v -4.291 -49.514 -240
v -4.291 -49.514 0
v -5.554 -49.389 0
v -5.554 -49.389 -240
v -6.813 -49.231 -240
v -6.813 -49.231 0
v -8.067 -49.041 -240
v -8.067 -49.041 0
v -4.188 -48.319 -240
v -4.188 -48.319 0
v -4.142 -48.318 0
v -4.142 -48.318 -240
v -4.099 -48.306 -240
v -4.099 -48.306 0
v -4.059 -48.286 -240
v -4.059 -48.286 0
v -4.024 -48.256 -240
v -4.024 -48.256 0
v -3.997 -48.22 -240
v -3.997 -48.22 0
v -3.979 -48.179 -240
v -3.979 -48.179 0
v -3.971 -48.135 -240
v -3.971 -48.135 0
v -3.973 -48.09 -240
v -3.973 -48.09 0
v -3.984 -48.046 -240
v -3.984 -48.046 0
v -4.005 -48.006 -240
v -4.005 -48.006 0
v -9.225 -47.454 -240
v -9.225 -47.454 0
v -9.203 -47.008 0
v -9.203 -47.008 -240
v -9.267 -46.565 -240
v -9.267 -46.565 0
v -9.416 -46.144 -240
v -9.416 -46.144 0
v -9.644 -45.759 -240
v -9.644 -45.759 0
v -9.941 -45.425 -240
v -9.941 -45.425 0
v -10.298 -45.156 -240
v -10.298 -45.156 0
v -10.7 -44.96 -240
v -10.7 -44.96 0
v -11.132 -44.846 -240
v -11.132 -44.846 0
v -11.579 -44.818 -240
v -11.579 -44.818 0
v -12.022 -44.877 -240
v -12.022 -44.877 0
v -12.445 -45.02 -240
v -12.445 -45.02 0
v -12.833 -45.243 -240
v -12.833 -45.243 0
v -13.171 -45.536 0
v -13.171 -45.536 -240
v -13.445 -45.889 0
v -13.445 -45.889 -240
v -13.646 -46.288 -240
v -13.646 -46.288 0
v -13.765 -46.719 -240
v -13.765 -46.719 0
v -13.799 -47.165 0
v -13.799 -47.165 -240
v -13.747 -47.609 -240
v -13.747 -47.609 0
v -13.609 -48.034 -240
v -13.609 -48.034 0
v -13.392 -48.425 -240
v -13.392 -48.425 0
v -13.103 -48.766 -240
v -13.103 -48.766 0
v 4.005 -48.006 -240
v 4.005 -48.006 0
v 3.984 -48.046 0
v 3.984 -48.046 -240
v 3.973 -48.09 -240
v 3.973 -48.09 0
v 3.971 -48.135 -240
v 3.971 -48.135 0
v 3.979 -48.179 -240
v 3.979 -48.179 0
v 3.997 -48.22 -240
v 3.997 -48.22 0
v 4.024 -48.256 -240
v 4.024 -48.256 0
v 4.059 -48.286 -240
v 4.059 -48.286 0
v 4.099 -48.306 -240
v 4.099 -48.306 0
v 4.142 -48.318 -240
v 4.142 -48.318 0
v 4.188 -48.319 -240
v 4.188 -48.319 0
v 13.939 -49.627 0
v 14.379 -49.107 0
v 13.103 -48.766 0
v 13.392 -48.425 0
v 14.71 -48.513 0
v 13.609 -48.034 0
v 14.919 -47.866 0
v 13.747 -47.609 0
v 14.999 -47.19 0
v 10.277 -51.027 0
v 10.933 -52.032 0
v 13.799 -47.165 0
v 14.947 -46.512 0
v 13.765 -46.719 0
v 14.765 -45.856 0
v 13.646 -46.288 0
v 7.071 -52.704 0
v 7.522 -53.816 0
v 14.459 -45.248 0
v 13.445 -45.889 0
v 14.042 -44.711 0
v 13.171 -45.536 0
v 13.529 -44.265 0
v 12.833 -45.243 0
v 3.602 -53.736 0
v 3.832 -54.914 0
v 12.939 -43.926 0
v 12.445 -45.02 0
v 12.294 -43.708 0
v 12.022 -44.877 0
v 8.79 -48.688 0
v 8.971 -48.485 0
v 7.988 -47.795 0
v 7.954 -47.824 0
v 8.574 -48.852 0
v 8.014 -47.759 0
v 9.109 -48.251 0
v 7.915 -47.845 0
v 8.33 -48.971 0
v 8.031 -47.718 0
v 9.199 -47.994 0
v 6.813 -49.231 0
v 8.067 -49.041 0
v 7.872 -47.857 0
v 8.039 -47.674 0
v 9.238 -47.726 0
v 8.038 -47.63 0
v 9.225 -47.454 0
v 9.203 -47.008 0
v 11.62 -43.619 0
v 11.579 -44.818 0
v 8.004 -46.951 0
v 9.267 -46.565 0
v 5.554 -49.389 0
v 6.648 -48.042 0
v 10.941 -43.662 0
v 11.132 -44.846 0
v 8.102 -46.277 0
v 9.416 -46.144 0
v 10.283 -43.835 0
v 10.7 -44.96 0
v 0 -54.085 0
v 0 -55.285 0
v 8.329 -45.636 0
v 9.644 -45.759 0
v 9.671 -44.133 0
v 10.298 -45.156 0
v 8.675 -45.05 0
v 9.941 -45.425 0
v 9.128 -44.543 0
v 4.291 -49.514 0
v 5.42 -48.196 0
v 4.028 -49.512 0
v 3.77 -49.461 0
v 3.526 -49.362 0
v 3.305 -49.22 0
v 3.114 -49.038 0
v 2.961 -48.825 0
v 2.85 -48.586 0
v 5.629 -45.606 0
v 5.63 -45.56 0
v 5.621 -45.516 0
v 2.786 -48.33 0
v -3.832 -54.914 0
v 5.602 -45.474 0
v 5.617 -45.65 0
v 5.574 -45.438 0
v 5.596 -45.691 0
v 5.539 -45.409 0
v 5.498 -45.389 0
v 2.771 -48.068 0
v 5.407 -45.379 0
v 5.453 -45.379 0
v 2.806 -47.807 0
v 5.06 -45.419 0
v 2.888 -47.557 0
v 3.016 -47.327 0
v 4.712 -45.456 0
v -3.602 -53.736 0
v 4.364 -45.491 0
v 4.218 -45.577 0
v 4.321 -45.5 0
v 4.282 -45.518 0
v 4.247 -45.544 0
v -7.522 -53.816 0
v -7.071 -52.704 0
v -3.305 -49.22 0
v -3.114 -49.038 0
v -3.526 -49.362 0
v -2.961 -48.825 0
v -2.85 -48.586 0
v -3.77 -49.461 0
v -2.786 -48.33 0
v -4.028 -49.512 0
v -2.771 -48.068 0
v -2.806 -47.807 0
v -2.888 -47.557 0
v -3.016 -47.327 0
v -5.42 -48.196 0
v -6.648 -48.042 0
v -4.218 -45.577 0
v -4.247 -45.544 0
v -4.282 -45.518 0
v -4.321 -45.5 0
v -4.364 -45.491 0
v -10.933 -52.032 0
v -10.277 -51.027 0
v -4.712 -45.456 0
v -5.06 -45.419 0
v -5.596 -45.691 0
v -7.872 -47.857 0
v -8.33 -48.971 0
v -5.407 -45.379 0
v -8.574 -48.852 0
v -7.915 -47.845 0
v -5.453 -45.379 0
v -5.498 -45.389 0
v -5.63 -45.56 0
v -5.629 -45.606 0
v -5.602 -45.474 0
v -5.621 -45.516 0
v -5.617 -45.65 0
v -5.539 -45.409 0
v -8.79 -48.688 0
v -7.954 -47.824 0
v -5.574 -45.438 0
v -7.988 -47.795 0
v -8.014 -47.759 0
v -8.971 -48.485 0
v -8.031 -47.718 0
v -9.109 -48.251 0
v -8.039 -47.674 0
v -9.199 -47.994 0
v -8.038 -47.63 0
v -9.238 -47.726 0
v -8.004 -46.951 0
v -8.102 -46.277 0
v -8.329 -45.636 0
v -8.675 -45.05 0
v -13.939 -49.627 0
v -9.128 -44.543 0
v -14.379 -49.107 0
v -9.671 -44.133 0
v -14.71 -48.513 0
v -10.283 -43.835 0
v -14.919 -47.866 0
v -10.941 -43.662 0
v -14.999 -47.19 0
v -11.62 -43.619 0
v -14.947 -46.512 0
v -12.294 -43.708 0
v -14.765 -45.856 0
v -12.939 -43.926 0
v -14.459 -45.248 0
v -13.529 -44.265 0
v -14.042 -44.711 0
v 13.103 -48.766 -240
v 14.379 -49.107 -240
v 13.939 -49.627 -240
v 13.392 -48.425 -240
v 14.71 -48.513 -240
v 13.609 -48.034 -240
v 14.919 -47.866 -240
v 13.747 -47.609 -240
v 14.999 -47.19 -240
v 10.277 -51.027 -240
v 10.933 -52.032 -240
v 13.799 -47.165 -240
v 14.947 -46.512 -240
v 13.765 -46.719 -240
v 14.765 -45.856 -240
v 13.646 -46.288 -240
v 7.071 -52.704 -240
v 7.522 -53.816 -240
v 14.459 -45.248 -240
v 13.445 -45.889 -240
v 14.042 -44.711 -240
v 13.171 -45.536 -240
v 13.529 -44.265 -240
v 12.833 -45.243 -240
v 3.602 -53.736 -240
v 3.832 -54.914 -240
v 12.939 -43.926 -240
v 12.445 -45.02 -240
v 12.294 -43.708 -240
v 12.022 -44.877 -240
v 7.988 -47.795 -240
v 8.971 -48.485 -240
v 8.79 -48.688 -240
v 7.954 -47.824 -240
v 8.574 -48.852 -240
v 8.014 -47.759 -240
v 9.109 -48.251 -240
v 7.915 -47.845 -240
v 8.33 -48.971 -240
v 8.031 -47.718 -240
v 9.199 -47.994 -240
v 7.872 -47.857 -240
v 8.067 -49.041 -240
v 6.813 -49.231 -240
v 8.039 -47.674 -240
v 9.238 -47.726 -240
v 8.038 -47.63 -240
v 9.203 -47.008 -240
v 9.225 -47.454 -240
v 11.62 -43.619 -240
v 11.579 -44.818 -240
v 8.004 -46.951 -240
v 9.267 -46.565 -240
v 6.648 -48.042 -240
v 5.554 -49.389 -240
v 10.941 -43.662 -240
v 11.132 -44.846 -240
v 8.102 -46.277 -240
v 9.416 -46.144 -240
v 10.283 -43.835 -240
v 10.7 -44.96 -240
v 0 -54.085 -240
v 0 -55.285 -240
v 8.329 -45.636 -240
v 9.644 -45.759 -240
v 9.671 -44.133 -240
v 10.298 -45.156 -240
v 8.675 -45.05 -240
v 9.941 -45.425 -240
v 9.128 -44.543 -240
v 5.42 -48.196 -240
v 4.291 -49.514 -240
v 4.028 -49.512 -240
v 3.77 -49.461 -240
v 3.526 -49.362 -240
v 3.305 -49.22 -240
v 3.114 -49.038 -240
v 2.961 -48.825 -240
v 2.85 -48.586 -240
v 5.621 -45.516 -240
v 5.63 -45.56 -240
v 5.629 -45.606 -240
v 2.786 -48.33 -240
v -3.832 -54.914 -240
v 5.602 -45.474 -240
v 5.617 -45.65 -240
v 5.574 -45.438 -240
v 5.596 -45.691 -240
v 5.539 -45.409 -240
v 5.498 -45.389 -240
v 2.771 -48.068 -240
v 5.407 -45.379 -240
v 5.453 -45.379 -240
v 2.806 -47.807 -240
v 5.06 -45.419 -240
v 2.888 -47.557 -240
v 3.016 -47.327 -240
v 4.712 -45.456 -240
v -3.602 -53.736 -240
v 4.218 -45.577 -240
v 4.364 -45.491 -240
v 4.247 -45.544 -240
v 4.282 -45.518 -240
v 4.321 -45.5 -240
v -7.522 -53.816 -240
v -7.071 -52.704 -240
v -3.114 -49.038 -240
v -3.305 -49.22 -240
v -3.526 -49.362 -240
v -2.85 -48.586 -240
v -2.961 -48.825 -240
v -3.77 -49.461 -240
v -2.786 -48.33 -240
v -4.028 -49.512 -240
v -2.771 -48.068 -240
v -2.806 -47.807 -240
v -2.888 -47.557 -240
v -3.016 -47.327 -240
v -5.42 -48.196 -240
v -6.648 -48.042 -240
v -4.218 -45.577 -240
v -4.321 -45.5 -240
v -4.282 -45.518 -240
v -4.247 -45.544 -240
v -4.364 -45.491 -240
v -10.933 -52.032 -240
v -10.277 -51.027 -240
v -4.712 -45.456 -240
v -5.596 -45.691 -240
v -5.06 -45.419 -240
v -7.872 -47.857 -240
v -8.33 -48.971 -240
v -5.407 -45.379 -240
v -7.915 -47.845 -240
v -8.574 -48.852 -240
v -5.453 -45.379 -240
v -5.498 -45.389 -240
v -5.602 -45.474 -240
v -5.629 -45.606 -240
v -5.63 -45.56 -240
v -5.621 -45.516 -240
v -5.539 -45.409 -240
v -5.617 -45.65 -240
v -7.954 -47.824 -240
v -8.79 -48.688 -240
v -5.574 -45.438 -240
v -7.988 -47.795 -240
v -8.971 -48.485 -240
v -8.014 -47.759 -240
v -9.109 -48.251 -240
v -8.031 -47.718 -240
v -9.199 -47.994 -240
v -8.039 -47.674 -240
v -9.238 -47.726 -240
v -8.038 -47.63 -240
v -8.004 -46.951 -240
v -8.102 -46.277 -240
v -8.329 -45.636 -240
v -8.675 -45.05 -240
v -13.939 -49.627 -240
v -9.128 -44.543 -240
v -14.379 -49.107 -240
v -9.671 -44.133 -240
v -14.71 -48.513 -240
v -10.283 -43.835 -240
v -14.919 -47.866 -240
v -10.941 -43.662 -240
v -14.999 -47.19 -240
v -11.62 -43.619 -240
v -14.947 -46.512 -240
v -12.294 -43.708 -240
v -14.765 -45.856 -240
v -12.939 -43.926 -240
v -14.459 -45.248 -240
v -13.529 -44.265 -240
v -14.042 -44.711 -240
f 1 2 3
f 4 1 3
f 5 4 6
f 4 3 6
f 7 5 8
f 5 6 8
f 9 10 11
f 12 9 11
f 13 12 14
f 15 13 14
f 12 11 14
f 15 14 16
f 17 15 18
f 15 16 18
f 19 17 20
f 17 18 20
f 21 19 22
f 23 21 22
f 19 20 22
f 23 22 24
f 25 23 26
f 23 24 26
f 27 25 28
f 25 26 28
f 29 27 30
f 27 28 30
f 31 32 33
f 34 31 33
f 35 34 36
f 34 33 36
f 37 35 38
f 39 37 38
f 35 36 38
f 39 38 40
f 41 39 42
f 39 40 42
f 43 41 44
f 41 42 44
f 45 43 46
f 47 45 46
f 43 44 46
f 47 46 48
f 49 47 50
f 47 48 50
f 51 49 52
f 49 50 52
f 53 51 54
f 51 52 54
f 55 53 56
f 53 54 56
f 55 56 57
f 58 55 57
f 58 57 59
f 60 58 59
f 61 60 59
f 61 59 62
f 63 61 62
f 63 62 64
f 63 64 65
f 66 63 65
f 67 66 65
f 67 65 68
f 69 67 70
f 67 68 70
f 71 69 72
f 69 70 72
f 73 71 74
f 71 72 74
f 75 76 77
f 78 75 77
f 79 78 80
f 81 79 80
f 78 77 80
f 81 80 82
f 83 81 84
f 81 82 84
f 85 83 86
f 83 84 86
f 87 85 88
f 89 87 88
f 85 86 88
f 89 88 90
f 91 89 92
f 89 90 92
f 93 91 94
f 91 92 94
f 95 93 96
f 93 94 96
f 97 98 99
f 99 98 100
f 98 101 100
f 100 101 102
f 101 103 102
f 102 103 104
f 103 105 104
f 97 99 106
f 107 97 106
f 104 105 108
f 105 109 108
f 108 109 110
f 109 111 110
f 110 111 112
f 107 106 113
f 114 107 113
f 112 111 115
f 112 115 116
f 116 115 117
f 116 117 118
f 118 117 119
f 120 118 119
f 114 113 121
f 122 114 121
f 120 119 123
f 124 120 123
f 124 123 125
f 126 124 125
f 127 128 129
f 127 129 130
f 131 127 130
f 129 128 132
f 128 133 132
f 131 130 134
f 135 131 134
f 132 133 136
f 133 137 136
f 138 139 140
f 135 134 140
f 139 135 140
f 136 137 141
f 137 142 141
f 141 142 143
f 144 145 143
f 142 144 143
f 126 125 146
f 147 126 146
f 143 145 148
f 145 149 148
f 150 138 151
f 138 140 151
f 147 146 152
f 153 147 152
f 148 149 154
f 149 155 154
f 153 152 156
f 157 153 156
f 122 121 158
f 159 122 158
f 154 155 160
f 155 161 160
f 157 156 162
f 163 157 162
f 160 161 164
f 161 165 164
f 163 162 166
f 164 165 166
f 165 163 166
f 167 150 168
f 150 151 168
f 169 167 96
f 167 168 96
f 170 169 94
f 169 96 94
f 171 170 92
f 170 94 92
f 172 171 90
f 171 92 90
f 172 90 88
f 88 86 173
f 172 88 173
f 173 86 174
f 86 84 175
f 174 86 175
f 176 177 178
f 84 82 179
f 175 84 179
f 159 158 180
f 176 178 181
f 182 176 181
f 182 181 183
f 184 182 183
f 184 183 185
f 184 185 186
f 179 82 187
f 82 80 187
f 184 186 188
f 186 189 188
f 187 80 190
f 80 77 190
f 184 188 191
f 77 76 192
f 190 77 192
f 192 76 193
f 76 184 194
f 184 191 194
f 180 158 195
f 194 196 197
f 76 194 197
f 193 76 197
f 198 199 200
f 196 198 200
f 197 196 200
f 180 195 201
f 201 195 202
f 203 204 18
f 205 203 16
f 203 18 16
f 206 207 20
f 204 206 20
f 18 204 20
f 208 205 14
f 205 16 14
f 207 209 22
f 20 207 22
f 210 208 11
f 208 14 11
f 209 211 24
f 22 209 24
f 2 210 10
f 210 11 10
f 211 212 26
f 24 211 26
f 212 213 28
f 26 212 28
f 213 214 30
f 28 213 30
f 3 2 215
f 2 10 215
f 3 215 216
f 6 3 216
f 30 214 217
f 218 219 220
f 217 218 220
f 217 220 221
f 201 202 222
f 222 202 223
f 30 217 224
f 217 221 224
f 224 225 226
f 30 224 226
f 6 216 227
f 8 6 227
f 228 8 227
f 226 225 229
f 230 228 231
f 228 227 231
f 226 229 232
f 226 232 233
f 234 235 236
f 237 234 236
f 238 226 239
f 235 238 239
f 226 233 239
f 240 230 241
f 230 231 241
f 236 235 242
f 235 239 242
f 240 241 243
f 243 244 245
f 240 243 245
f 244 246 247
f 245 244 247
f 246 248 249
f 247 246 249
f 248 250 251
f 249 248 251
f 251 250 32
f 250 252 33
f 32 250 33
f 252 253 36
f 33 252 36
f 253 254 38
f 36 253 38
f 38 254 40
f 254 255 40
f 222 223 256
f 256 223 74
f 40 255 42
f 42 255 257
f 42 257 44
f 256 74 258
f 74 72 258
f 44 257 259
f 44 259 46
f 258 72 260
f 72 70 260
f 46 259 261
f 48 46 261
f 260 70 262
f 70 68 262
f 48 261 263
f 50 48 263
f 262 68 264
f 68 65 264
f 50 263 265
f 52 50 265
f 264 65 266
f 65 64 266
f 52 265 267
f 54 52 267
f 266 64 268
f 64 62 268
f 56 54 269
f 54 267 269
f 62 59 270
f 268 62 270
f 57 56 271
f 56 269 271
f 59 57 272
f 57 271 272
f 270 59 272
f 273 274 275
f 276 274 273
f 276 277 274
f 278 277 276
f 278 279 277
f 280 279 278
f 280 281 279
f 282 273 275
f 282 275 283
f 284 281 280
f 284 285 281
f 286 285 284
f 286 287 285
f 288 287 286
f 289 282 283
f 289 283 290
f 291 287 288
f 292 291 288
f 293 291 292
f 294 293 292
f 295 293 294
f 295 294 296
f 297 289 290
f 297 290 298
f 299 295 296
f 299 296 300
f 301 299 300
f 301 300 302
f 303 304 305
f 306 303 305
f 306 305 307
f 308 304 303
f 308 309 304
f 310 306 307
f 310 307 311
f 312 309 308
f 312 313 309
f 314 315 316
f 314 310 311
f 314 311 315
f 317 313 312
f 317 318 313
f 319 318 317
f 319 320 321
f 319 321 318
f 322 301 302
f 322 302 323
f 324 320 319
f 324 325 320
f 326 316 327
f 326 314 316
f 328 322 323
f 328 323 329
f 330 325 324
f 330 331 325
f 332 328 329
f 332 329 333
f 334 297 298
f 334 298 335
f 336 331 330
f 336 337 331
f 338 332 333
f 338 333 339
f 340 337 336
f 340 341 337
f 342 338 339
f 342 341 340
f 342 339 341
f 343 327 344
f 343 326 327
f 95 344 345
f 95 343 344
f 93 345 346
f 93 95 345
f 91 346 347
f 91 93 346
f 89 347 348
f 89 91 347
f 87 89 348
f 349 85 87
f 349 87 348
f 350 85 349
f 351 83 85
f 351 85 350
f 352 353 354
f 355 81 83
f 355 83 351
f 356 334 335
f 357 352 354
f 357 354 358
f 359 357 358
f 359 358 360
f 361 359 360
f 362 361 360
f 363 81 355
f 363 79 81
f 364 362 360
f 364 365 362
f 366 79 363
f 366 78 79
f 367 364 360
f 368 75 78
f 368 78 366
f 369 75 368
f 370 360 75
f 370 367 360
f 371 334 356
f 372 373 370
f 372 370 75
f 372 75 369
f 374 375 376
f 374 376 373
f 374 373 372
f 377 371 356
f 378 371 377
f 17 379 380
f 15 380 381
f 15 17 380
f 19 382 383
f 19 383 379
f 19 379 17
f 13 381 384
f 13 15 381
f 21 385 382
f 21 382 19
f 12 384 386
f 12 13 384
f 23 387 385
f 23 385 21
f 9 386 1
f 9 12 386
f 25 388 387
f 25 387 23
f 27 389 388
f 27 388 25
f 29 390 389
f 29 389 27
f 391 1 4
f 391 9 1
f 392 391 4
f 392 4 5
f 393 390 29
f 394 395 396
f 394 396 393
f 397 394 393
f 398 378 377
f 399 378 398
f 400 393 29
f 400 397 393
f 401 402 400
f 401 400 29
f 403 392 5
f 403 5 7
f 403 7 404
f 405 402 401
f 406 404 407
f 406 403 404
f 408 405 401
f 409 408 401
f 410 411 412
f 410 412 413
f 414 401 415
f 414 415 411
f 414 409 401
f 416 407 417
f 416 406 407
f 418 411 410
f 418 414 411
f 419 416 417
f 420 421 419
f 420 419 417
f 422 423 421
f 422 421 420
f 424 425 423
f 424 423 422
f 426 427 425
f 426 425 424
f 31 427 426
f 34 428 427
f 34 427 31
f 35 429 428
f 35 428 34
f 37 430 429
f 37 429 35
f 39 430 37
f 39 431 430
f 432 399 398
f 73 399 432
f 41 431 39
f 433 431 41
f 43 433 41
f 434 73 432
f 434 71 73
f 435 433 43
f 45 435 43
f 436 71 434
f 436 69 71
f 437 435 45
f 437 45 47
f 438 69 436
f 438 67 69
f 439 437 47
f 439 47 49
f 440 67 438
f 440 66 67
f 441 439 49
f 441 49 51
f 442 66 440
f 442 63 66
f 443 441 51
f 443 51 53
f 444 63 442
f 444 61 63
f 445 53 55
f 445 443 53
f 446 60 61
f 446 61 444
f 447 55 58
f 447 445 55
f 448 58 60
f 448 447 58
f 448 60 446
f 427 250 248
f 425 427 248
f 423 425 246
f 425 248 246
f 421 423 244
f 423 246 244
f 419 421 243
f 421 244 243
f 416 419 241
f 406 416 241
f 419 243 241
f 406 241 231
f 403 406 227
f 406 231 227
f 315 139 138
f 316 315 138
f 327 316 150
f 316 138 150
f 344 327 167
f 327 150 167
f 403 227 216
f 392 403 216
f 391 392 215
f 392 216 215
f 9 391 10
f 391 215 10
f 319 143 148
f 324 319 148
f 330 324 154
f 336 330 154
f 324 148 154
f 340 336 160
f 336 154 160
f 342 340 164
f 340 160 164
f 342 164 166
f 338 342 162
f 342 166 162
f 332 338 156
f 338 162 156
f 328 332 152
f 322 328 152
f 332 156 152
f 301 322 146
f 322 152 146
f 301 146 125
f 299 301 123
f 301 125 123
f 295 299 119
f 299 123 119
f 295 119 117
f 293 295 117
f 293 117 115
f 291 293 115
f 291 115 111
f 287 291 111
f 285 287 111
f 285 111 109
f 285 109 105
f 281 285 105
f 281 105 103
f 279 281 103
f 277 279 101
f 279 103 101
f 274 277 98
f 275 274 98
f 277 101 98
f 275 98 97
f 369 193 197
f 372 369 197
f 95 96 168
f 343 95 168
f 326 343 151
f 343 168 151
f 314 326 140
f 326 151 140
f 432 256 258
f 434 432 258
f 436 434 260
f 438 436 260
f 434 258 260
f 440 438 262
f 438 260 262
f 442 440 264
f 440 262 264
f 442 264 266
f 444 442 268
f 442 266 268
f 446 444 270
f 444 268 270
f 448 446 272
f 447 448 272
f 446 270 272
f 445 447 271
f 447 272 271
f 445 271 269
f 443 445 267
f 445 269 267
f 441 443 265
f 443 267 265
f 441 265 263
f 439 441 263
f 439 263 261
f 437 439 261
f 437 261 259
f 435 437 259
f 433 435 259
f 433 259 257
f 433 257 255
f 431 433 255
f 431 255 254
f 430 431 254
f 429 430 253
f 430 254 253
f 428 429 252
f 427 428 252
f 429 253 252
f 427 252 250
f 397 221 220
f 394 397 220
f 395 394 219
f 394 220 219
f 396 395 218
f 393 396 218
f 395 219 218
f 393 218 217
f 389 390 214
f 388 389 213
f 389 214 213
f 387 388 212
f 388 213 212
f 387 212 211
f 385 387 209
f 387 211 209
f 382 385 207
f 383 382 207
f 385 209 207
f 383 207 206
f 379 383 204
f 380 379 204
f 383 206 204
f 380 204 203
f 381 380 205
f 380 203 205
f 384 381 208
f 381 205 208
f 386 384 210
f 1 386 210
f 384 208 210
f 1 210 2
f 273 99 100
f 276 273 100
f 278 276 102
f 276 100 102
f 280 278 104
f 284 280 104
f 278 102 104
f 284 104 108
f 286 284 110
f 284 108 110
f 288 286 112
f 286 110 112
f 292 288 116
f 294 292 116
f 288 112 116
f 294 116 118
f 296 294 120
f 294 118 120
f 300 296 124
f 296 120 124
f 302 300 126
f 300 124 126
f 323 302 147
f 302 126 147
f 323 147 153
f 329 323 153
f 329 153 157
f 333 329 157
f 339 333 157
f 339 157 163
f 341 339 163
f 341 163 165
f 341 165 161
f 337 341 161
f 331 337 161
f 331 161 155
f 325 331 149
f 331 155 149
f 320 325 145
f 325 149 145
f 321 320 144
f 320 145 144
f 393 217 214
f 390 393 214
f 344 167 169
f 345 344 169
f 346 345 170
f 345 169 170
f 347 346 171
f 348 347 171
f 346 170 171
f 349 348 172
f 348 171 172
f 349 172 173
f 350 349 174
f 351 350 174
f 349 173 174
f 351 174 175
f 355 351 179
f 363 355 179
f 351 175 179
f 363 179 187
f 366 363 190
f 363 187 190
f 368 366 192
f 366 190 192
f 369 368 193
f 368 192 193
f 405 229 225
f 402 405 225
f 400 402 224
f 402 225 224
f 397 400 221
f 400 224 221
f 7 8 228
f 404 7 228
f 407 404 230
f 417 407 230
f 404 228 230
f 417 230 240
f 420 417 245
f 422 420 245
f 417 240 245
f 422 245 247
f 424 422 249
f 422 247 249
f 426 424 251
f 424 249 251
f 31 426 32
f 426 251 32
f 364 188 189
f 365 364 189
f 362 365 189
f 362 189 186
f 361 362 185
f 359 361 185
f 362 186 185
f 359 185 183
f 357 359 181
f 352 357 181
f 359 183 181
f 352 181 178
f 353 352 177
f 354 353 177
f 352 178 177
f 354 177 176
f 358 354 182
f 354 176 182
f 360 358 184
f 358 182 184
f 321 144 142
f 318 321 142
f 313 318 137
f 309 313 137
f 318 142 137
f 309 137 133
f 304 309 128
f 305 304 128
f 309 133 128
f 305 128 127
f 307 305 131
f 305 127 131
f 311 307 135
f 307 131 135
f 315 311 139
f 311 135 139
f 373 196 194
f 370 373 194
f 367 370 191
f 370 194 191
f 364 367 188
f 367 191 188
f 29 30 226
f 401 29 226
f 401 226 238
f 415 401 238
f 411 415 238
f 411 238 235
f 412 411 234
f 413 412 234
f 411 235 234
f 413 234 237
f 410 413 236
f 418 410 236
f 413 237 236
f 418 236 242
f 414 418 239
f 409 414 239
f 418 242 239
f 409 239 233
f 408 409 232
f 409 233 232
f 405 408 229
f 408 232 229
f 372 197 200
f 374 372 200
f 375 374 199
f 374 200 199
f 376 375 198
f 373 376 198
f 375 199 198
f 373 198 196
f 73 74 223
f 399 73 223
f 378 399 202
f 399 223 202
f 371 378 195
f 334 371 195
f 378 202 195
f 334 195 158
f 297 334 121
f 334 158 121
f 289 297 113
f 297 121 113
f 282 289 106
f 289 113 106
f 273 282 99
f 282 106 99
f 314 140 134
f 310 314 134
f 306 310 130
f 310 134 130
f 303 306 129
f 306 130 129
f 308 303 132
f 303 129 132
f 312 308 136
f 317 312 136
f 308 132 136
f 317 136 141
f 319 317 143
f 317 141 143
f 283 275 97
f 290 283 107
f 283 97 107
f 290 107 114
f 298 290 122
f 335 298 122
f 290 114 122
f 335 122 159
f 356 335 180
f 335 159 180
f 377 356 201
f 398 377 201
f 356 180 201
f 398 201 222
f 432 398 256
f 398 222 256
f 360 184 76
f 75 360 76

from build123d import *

# Parameters (mm, degrees)
BOSS_EXTRUDE1_DEPTH = 240


with BuildPart() as part:
    # Sketch1 → Boss-Extrude1 (new body)
    with BuildSketch(Plane.XY):
        with BuildLine():
            Line((-4.005405916, -48.006392066), (-5.596014404, -45.690783174))
            ThreePointArc((-5.596014404, -45.690783174), (-5.602314544, -45.474072701), (-5.407495225, -45.378948813))
            ThreePointArc((-5.407495225, -45.378948813), (-4.886118258, -45.438044064), (-4.364097153, -45.491149206))
            ThreePointArc((-4.364097153, -45.491149206), (-4.281696906, -45.51790434), (-4.218342055, -45.576995799))
            Line((-4.218342055, -45.576995799), (-3.016281965, -47.326955674))
            ThreePointArc((-3.016281965, -47.326955674), (-2.9606913, -48.824573862), (-4.291137006, -49.514403391))
            ThreePointArc((-4.291137006, -49.514403391), (-6.183725625, -49.313806762), (-8.067246452, -49.040896553))
            ThreePointArc((-8.067246452, -49.040896553), (-8.970999234, -48.484593683), (-9.22486491, -47.4541597))
            ThreePointArc((-9.22486491, -47.4541597), (-12.237087805, -44.938183329), (-13.103030303, -48.766207291))
            ThreePointArc((-13.103030303, -48.766207291), (0, -54.084716391), (13.103030303, -48.766207291))
            ThreePointArc((13.103030303, -48.766207291), (12.237087805, -44.938183329), (9.22486491, -47.4541597))
            ThreePointArc((9.22486491, -47.4541597), (8.970999234, -48.484593683), (8.067246452, -49.040896553))
            ThreePointArc((8.067246452, -49.040896553), (6.183725625, -49.313806762), (4.291137006, -49.514403391))
            ThreePointArc((4.291137006, -49.514403391), (2.9606913, -48.824573862), (3.016281965, -47.326955674))
            Line((3.016281965, -47.326955674), (4.218342055, -45.576995799))
            ThreePointArc((4.218342055, -45.576995799), (4.281696906, -45.51790434), (4.364097153, -45.491149206))
            ThreePointArc((4.364097153, -45.491149206), (4.886118258, -45.438044064), (5.407495225, -45.378948813))
            ThreePointArc((5.407495225, -45.378948813), (5.602314544, -45.474072701), (5.596014404, -45.690783174))
            Line((5.596014404, -45.690783174), (4.005405916, -48.006392066))
            ThreePointArc((4.005405916, -48.006392066), (3.997464392, -48.220337521), (4.187528064, -48.318884597))
            ThreePointArc((4.187528064, -48.318884597), (6.034420378, -48.123131348), (7.872463841, -47.856810519))
            ThreePointArc((7.872463841, -47.856810519), (8.001571382, -47.777338681), (8.037837907, -47.630133826))
            ThreePointArc((8.037837907, -47.630133826), (12.621655355, -43.801474132), (13.939393939, -49.626727987))
            ThreePointArc((13.939393939, -49.626727987), (0, -55.284716391), (-13.939393939, -49.626727987))
            ThreePointArc((-13.939393939, -49.626727987), (-12.621655355, -43.801474132), (-8.037837907, -47.630133826))
            ThreePointArc((-8.037837907, -47.630133826), (-8.001571382, -47.777338681), (-7.872463841, -47.856810519))
            ThreePointArc((-7.872463841, -47.856810519), (-6.034420378, -48.123131348), (-4.187528064, -48.318884597))
            ThreePointArc((-4.187528064, -48.318884597), (-3.997464392, -48.220337521), (-4.005405916, -48.006392066))
        make_face()
    extrude(amount=-BOSS_EXTRUDE1_DEPTH)


solid = part.part
